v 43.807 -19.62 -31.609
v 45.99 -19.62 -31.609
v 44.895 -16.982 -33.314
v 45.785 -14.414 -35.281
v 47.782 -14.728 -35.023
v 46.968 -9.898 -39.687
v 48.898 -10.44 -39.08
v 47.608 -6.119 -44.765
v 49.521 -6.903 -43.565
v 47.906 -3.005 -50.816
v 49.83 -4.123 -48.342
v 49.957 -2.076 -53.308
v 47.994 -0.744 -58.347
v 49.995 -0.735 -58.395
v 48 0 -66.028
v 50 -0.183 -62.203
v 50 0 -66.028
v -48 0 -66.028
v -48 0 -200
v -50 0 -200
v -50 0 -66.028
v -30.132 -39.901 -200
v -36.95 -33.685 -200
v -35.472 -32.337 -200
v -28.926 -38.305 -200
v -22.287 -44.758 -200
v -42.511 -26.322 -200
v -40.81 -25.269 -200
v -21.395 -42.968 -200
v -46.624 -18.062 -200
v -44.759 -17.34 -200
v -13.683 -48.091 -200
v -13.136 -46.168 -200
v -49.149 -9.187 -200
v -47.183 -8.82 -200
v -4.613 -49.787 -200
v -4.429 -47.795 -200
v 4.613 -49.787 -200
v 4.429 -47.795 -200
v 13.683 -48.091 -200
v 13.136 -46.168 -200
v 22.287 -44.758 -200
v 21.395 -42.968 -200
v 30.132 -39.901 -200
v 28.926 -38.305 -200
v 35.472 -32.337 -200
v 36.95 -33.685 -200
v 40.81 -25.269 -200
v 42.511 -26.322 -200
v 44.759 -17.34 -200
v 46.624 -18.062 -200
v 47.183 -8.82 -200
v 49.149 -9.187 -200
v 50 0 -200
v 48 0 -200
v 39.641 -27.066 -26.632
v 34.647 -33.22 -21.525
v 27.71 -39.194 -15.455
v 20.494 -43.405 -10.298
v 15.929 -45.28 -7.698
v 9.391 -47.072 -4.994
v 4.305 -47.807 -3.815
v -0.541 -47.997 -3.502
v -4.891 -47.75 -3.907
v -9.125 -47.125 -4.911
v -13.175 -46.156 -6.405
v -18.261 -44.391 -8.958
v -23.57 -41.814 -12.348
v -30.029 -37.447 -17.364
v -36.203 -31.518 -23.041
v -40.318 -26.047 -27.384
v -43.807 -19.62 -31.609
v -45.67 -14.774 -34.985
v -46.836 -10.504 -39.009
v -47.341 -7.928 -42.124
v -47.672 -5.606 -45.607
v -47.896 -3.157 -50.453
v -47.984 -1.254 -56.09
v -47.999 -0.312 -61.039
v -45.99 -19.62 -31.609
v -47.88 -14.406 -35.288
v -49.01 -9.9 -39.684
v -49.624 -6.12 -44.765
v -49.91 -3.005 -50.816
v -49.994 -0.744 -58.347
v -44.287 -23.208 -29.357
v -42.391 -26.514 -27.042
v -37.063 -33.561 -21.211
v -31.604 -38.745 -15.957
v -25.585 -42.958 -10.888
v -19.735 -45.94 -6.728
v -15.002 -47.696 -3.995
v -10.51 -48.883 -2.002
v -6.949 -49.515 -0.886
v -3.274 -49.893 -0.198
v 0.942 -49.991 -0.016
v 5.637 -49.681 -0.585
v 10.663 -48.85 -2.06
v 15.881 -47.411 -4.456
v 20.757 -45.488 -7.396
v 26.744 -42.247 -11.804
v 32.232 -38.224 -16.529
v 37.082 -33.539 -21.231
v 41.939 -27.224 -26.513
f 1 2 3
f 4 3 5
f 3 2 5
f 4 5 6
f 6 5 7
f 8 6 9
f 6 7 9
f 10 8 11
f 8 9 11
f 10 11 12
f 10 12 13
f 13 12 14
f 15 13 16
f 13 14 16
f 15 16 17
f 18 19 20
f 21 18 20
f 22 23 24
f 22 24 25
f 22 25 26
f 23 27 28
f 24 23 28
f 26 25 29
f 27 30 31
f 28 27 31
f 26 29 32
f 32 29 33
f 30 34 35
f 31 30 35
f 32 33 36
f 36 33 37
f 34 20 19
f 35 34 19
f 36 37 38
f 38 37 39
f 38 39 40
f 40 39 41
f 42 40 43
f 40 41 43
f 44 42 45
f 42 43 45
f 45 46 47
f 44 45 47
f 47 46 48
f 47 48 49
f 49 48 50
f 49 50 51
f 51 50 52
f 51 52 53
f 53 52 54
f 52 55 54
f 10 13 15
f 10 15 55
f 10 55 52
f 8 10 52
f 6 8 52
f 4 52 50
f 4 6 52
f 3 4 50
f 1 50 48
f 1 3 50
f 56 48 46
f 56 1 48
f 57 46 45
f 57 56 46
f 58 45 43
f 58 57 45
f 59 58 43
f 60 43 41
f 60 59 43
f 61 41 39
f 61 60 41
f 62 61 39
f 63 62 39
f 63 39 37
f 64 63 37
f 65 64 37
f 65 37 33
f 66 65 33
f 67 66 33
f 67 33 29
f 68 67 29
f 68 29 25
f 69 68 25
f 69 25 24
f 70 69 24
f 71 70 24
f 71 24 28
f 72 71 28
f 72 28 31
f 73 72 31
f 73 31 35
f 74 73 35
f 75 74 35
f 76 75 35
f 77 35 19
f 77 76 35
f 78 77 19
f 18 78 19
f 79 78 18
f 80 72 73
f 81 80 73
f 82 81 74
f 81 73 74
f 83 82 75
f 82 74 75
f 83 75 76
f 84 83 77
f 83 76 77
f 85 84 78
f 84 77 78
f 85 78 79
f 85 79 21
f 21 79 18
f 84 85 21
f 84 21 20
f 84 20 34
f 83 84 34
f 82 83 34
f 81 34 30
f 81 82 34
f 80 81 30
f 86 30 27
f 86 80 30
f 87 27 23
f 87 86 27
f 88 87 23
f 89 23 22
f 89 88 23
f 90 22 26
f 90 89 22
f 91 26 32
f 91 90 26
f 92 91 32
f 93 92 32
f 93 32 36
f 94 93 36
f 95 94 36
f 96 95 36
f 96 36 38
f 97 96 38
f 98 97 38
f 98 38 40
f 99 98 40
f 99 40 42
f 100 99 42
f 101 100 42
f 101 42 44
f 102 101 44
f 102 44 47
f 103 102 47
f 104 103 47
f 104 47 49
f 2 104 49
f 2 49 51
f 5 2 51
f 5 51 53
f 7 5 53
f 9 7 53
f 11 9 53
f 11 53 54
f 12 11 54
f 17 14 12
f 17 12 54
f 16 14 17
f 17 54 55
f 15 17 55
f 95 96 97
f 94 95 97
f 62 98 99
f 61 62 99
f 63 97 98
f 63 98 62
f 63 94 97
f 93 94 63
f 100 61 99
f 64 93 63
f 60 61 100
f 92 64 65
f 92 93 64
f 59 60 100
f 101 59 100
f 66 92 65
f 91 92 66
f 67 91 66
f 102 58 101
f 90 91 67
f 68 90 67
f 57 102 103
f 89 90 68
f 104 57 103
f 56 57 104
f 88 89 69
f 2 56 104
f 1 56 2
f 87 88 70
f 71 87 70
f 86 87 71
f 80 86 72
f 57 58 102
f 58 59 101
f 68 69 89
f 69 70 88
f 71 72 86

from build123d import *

# Parameters (mm, degrees)
EXTRUDE_THIN1_DEPTH     = 200
CUT_EXTRUDE1_DEPTH      = 213.132034356
CUT_EXTRUDE1_DEPTH_BACK = 213.132034356
FILLET1_R               = 40


with BuildPart() as part:
    # Sketch1 → Extrude-Thin1 (new body)
    with BuildSketch(Plane.XY):
        with BuildLine():
            ThreePointArc((-50, 0), (0, -50), (50, 0))
            Line((50, 0), (48, 0))
            ThreePointArc((48, 0), (0, -48), (-48, 0))
            Line((-48, 0), (-50, 0))
        make_face()
    extrude(amount=-EXTRUDE_THIN1_DEPTH)

    # Sketch2 → Cut-Extrude1 (cut, two sides: drawn at the far end of the back side and taken through both)
    with BuildSketch(Plane(origin=(0, 0, 0), x_dir=(0, 0, -1), z_dir=(1, 0, 0)).offset(-CUT_EXTRUDE1_DEPTH_BACK)):
        with BuildLine():
            Line((0, 0), (0, -50))
            ThreePointArc((0, -50), (25.082111762, -29.065689409), (40, 0))
            Line((40, 0), (0, 0))
        make_face()
    extrude(amount=CUT_EXTRUDE1_DEPTH + CUT_EXTRUDE1_DEPTH_BACK, mode=Mode.SUBTRACT)

    # Fillet1
    # the kernel refuses this fillet: 40 mm, written as the material it takes off along each edge
    with BuildSketch(Plane(origin=(115.07027284, 0, -40), x_dir=(0, 0, -1), z_dir=(-1, 0, 0)), Plane(origin=(17.07027284, 0, -40), x_dir=(0, 0, -1), z_dir=(-1, 0, 0))) as fillet1_piece_1:
        with BuildLine():
            CenterArc((26.028109136, 40), FILLET1_R, 210.63069692, 59.36930308)
            ThreePointArc((-8.390657995, 19.619900167), (-3.554396204, 10.084051777), (0, 0))
            Line((0, 0), (26.028109136, 0))
        make_face()
    extrude(amount=132.140545681, mode=Mode.SUBTRACT)


solid = part.part
